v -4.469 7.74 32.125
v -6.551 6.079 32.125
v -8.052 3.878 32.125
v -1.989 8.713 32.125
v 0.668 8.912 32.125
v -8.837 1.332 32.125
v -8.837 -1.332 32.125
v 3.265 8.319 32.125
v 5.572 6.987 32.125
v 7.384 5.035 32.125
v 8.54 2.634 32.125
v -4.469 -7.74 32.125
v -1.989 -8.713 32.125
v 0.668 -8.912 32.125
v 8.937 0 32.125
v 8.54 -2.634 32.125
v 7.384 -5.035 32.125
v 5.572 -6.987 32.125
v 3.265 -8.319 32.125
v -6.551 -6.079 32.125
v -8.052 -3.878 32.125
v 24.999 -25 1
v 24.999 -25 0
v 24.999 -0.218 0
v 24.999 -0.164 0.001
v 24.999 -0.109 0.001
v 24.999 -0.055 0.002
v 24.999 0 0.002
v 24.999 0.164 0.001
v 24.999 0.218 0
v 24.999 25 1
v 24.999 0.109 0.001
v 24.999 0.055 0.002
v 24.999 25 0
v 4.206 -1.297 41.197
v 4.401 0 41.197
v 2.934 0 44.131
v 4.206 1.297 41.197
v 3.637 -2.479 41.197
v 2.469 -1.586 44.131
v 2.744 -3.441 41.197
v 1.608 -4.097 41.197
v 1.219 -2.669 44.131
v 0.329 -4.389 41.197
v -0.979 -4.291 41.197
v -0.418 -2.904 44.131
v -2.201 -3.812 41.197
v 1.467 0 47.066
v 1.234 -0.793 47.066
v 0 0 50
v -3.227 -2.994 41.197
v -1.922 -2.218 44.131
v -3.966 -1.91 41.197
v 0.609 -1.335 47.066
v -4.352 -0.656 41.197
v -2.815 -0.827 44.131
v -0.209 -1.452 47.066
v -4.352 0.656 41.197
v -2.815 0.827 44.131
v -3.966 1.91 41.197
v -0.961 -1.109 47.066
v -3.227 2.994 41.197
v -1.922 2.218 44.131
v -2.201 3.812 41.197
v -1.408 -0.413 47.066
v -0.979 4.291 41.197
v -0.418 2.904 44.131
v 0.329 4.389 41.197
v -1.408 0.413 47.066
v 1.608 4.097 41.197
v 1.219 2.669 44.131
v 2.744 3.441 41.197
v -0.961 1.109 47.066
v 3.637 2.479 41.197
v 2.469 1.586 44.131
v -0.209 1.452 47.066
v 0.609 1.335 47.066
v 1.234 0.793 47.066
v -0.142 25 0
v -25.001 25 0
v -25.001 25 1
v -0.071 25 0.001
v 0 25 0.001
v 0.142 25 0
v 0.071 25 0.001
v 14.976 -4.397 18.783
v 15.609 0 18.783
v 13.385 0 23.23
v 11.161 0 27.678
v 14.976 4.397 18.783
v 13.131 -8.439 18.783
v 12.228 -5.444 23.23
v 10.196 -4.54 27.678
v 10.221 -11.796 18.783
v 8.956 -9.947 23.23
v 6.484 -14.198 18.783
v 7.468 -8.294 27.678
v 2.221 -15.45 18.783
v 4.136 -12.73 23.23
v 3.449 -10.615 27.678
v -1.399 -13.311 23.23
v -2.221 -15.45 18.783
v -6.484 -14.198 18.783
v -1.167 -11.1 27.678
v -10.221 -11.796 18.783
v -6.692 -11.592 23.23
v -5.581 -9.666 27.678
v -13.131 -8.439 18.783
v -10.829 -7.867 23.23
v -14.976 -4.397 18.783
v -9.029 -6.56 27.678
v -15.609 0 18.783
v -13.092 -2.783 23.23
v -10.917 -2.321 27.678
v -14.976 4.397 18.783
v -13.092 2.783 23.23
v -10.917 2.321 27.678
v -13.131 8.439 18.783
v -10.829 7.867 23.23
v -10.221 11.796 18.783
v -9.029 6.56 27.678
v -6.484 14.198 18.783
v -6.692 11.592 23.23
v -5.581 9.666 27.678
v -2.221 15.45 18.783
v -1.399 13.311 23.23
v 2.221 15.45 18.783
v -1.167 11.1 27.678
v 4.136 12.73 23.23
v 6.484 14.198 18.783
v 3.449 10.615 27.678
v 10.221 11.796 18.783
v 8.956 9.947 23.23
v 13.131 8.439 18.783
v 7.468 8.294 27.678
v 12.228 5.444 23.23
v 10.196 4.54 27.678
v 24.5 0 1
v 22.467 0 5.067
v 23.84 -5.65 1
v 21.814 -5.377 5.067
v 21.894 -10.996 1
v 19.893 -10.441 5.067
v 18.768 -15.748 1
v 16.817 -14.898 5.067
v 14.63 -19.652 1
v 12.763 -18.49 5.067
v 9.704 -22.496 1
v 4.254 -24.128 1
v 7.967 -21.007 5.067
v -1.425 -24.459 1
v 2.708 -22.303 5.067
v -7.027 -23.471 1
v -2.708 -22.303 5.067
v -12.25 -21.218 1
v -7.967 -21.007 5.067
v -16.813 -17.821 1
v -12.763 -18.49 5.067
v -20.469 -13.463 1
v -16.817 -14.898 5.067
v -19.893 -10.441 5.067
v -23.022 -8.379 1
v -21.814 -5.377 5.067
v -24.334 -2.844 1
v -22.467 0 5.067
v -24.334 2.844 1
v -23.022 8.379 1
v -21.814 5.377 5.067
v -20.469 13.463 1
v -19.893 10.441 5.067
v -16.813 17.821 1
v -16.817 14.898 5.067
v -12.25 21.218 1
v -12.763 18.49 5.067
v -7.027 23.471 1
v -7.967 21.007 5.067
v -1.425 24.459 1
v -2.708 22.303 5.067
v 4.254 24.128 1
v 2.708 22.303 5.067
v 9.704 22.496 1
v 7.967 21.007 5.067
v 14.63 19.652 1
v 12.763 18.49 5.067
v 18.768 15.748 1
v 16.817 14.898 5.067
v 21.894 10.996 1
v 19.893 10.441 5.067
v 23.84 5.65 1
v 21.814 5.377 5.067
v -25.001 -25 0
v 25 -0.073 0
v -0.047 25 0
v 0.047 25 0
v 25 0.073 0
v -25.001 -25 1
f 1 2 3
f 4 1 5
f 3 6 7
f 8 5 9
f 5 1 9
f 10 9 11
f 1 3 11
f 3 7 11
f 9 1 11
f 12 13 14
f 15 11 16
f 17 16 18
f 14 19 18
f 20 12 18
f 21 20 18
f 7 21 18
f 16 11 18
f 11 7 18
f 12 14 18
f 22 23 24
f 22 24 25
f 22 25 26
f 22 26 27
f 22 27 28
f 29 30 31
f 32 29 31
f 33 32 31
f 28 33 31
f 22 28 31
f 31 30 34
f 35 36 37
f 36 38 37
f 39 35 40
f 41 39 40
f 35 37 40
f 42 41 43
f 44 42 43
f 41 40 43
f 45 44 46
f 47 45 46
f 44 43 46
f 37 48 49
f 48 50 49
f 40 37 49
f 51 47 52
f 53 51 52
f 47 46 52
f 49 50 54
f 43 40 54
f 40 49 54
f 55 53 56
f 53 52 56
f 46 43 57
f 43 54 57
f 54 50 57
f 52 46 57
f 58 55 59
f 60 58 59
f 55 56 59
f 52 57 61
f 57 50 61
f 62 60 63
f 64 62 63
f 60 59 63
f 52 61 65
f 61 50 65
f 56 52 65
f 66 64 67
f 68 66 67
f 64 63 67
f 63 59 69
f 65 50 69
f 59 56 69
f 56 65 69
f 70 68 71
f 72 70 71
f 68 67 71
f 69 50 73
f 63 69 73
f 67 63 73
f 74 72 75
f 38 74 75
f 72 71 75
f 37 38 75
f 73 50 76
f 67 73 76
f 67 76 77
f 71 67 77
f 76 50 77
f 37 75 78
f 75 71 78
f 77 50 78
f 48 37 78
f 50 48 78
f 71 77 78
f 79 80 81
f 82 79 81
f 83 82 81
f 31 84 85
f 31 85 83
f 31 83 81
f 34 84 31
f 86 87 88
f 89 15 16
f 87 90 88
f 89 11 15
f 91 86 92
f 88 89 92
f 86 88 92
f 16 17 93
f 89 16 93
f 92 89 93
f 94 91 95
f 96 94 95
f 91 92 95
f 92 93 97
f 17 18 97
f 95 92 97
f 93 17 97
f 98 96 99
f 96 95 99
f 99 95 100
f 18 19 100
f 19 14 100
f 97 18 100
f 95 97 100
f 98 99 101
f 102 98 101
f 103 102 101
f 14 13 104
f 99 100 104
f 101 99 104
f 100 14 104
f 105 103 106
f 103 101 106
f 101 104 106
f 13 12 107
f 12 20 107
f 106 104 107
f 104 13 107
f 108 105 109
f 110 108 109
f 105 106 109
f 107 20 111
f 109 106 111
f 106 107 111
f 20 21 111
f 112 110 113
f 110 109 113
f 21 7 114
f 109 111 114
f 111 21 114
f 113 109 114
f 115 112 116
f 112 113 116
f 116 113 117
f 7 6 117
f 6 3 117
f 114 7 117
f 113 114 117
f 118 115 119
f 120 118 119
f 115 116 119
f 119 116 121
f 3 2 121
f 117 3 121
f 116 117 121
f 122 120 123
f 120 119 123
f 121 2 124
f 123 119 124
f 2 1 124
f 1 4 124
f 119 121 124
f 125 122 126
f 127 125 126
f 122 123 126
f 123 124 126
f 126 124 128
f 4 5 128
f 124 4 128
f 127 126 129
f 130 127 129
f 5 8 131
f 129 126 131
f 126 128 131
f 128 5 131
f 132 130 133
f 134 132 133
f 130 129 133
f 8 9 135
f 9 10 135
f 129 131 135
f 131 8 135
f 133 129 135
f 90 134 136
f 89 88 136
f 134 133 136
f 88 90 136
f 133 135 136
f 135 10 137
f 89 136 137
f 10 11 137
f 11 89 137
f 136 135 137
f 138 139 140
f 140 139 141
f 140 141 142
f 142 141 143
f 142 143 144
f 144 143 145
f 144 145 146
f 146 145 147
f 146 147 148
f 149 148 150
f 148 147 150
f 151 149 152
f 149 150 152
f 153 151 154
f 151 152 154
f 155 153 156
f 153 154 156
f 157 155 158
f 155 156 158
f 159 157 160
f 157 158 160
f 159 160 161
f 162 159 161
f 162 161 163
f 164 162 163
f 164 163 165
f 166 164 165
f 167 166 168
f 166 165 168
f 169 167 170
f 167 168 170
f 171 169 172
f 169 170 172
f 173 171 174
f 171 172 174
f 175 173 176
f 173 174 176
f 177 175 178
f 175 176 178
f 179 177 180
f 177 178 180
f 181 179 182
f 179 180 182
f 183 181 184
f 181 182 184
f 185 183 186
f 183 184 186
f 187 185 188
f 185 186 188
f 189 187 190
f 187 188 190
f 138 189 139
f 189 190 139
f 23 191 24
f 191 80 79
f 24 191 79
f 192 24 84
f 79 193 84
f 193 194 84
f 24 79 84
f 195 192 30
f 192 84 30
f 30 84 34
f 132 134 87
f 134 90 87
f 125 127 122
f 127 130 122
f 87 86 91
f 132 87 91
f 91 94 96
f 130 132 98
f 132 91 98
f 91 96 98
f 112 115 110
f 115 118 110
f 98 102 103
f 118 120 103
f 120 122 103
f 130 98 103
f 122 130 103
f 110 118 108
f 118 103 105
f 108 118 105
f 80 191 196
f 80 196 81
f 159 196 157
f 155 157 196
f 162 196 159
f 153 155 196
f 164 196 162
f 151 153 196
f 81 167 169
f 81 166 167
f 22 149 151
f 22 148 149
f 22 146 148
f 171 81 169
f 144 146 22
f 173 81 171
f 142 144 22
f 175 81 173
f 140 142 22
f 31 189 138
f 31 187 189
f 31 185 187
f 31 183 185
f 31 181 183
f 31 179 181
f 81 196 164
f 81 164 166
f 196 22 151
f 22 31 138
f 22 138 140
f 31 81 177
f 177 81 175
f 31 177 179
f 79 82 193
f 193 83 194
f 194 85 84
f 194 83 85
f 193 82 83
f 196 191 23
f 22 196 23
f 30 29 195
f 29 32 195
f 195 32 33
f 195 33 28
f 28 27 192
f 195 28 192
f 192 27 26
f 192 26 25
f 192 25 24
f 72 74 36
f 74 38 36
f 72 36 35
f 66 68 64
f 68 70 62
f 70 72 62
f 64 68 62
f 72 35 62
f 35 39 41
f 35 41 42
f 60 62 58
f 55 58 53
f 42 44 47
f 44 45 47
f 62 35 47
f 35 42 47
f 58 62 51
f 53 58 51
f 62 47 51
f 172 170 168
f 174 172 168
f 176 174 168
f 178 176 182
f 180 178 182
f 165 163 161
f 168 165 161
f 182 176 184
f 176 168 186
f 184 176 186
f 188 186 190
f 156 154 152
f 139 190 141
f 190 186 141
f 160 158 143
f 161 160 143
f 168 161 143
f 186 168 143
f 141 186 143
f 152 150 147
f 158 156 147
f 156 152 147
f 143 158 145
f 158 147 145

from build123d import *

# Parameters (mm, degrees)
F2_W     = 50
F2_H     = 50
F3_DEPTH = 1


with BuildPart() as f1:
    # F0 (on Front) → F1 (revolve)
    with BuildSketch(Plane.XZ):
        Polygon((0, 5.066604), (0, 0), (25, 0), (22.466698, 5.066604), align=None)
        Polygon((4.40149, 41.197021), (0, 50), (0, 41.197021), align=None)
        Polygon((8.937266, 32.125468), (0, 32.125468), (0, 18.782796), (15.608602, 18.782796), align=None)
    revolve(axis=Axis((0, 0, 25.454132), (0, 0, -1)))

    # F2 (on Top) → F3 (join)
    with BuildSketch(Plane.XY):
        with Locations((-0.000951, -0.000403)):
            Rectangle(F2_W, F2_H)
    extrude(amount=F3_DEPTH)


solid = f1.part
